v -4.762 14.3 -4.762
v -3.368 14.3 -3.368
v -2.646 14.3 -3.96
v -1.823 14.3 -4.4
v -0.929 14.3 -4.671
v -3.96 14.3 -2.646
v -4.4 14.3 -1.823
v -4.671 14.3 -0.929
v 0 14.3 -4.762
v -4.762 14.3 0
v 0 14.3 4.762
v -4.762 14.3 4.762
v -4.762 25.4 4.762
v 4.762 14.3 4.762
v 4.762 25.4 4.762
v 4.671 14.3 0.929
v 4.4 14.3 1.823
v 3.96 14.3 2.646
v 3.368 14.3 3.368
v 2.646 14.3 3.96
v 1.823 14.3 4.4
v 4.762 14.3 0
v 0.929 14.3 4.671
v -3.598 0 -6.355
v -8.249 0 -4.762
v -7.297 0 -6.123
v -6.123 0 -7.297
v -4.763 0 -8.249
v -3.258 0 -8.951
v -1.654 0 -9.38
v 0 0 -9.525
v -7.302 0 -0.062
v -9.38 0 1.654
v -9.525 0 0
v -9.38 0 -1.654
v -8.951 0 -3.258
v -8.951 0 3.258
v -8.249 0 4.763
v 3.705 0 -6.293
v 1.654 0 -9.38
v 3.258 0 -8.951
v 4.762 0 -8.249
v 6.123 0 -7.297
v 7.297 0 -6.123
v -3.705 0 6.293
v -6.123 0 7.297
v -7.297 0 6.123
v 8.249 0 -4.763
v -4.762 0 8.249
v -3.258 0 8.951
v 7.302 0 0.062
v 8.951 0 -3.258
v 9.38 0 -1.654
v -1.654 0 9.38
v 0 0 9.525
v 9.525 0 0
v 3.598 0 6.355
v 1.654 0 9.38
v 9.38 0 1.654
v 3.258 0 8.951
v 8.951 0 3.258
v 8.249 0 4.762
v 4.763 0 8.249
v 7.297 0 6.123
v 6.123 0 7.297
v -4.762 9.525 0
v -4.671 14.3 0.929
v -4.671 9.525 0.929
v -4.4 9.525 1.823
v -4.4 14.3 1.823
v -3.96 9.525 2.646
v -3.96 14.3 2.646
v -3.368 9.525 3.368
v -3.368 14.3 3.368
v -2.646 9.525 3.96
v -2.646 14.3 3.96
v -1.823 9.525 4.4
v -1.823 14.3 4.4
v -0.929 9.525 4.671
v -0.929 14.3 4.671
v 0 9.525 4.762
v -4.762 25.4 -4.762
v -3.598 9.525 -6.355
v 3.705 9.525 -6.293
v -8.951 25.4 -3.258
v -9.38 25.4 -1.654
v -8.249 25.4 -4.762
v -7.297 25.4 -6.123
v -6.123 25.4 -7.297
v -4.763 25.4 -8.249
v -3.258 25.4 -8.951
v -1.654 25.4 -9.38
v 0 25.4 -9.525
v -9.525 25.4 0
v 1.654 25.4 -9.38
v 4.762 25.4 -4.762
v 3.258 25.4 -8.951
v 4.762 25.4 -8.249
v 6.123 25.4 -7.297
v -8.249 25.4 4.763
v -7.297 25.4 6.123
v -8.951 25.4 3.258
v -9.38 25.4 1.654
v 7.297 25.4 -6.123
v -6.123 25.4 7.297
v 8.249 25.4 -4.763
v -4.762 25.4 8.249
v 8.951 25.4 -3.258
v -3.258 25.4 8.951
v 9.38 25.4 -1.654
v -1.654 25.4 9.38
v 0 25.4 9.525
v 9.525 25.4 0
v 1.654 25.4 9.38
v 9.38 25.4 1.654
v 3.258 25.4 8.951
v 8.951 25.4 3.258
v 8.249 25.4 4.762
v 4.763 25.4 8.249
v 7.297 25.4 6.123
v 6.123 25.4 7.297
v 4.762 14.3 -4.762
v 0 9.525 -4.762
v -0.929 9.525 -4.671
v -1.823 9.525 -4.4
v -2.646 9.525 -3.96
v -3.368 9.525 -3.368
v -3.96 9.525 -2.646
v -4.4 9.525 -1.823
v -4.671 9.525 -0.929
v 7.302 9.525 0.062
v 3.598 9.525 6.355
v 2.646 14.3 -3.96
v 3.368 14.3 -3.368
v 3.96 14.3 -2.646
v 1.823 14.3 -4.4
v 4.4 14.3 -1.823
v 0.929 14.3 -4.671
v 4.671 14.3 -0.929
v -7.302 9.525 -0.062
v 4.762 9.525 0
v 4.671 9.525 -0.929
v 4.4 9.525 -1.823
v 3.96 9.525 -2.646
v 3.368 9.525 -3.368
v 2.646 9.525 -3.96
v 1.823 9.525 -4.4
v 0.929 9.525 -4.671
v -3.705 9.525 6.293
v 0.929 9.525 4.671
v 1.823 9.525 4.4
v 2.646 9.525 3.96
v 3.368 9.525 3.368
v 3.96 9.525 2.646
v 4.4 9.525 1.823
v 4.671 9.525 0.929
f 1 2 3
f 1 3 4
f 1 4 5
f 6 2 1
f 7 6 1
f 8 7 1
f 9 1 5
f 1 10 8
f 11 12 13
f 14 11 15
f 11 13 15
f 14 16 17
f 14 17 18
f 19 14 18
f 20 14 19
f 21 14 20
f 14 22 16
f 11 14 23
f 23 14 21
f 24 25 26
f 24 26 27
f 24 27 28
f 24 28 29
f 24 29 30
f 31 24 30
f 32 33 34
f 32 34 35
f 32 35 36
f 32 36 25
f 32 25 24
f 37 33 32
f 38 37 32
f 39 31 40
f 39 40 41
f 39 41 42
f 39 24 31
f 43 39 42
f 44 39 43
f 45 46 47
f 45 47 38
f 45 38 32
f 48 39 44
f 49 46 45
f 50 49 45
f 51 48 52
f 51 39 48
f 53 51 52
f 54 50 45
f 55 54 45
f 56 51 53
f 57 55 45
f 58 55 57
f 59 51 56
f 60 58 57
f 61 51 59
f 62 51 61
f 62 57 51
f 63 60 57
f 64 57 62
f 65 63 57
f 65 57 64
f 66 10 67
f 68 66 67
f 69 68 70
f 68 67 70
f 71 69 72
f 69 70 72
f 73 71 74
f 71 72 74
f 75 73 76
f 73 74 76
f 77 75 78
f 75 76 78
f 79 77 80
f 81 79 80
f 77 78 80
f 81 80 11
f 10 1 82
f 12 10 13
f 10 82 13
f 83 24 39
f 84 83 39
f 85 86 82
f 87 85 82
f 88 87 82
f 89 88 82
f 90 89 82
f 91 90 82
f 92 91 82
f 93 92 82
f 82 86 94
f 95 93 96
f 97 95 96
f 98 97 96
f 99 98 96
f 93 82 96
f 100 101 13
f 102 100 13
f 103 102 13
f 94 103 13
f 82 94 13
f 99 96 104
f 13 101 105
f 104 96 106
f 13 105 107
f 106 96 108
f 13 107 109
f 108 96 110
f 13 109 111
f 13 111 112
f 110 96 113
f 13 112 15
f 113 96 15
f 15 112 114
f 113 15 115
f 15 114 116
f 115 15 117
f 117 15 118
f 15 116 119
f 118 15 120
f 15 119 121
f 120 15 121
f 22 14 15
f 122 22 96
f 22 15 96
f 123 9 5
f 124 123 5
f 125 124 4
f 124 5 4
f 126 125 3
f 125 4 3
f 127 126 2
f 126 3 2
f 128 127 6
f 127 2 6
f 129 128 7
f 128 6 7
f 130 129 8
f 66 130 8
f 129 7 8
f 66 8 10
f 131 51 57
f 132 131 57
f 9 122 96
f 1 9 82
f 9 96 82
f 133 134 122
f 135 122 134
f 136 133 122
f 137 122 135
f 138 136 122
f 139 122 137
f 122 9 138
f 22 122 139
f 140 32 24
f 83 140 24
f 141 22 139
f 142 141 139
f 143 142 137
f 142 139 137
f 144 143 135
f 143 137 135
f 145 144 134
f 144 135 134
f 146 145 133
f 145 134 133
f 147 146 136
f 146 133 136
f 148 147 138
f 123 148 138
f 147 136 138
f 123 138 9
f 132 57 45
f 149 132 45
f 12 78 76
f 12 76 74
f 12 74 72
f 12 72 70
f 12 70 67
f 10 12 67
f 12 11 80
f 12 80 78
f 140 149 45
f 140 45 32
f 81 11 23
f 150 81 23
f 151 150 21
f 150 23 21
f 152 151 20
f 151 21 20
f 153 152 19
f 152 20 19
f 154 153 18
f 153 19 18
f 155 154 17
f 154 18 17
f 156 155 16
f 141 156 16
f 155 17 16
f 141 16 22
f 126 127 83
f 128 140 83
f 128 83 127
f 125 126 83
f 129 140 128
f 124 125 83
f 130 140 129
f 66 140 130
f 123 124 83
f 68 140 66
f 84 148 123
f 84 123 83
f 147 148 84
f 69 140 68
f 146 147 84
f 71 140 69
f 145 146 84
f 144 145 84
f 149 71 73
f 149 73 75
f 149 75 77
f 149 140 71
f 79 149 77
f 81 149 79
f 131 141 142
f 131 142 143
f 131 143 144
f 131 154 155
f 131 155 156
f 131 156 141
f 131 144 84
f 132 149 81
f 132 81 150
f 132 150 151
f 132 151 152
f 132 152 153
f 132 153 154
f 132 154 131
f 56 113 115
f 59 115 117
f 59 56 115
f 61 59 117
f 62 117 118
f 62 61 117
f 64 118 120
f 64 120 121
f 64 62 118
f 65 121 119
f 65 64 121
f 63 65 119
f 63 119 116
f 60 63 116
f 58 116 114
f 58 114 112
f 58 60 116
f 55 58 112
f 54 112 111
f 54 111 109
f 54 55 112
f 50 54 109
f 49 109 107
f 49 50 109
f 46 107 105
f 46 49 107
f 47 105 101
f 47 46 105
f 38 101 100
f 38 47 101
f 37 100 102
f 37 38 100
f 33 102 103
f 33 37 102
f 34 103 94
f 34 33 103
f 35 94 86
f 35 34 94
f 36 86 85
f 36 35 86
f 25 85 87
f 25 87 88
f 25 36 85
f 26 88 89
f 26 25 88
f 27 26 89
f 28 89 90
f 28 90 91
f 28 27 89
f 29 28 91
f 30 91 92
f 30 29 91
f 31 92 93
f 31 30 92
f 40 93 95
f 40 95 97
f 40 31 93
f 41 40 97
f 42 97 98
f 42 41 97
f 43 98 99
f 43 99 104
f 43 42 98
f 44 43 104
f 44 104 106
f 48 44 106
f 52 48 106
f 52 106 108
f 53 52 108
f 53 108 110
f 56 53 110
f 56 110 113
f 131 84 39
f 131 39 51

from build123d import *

# Parameters (mm, degrees)
F0_R     = 9.525
F1_DEPTH = 25.4
F3_DEPTH = 25.401
F4_DEPTH = 11.0998
F6_DEPTH = 9.525


with BuildPart() as f1:
    # F0 (on Front) → F1 (new body)
    with BuildSketch(Plane.XZ):
        Circle(F0_R)
    extrude(amount=-F1_DEPTH)

    # F2 (on face) → F3 (cut, through all)
    with BuildSketch(Plane(origin=(0, 25.4, 0), x_dir=(-1, 0, 0), z_dir=(0, 1, 0))):
        with BuildLine():
            ThreePointArc((-4.7625, 0), (-3.367596, -3.367596), (0, -4.7625))
            ThreePointArc((0, -4.7625), (3.367596, -3.367596), (4.7625, 0))
            ThreePointArc((4.7625, 0), (3.367596, 3.367596), (0, 4.7625))
            ThreePointArc((0, 4.7625), (-3.367596, 3.367596), (-4.7625, 0))
        make_face()
    extrude(amount=-F3_DEPTH, mode=Mode.SUBTRACT)

    # F2 (on face) → F4 (cut)
    with BuildSketch(Plane(origin=(0, 25.4, 0), x_dir=(-1, 0, 0), z_dir=(0, 1, 0))):
        with BuildLine():
            Line((0, -4.7625), (4.7625, -4.7625))
            Line((4.7625, -4.7625), (4.7625, 0))
            ThreePointArc((4.7625, 0), (3.367596, -3.367596), (0, -4.7625))
        make_face()
        with BuildLine():
            Line((-4.7625, -4.7625), (0, -4.7625))
            ThreePointArc((0, -4.7625), (-3.367596, -3.367596), (-4.7625, 0))
            Line((-4.7625, 0), (-4.7625, -4.7625))
        make_face()
        with BuildLine():
            ThreePointArc((0, 4.7625), (3.367596, 3.367596), (4.7625, 0))
            Line((4.7625, 0), (4.7625, 4.7625))
            Line((4.7625, 4.7625), (0, 4.7625))
        make_face()
        with BuildLine():
            Line((-4.7625, 4.7625), (-4.7625, 0))
            ThreePointArc((-4.7625, 0), (-3.367596, 3.367596), (0, 4.7625))
            Line((0, 4.7625), (-4.7625, 4.7625))
        make_face()
    extrude(amount=-F4_DEPTH, mode=Mode.SUBTRACT)

    # F5 (on face) → F6 (cut)
    with BuildSketch(Plane.XZ):
        Polygon((3.704864, -6.293196), (7.3025, 0.061908), (3.597636, 6.355105), (-3.704864, 6.293196), (-7.3025, -0.061908), (-3.597636, -6.355105), align=None)
    extrude(amount=-F6_DEPTH, mode=Mode.SUBTRACT)


solid = f1.part
